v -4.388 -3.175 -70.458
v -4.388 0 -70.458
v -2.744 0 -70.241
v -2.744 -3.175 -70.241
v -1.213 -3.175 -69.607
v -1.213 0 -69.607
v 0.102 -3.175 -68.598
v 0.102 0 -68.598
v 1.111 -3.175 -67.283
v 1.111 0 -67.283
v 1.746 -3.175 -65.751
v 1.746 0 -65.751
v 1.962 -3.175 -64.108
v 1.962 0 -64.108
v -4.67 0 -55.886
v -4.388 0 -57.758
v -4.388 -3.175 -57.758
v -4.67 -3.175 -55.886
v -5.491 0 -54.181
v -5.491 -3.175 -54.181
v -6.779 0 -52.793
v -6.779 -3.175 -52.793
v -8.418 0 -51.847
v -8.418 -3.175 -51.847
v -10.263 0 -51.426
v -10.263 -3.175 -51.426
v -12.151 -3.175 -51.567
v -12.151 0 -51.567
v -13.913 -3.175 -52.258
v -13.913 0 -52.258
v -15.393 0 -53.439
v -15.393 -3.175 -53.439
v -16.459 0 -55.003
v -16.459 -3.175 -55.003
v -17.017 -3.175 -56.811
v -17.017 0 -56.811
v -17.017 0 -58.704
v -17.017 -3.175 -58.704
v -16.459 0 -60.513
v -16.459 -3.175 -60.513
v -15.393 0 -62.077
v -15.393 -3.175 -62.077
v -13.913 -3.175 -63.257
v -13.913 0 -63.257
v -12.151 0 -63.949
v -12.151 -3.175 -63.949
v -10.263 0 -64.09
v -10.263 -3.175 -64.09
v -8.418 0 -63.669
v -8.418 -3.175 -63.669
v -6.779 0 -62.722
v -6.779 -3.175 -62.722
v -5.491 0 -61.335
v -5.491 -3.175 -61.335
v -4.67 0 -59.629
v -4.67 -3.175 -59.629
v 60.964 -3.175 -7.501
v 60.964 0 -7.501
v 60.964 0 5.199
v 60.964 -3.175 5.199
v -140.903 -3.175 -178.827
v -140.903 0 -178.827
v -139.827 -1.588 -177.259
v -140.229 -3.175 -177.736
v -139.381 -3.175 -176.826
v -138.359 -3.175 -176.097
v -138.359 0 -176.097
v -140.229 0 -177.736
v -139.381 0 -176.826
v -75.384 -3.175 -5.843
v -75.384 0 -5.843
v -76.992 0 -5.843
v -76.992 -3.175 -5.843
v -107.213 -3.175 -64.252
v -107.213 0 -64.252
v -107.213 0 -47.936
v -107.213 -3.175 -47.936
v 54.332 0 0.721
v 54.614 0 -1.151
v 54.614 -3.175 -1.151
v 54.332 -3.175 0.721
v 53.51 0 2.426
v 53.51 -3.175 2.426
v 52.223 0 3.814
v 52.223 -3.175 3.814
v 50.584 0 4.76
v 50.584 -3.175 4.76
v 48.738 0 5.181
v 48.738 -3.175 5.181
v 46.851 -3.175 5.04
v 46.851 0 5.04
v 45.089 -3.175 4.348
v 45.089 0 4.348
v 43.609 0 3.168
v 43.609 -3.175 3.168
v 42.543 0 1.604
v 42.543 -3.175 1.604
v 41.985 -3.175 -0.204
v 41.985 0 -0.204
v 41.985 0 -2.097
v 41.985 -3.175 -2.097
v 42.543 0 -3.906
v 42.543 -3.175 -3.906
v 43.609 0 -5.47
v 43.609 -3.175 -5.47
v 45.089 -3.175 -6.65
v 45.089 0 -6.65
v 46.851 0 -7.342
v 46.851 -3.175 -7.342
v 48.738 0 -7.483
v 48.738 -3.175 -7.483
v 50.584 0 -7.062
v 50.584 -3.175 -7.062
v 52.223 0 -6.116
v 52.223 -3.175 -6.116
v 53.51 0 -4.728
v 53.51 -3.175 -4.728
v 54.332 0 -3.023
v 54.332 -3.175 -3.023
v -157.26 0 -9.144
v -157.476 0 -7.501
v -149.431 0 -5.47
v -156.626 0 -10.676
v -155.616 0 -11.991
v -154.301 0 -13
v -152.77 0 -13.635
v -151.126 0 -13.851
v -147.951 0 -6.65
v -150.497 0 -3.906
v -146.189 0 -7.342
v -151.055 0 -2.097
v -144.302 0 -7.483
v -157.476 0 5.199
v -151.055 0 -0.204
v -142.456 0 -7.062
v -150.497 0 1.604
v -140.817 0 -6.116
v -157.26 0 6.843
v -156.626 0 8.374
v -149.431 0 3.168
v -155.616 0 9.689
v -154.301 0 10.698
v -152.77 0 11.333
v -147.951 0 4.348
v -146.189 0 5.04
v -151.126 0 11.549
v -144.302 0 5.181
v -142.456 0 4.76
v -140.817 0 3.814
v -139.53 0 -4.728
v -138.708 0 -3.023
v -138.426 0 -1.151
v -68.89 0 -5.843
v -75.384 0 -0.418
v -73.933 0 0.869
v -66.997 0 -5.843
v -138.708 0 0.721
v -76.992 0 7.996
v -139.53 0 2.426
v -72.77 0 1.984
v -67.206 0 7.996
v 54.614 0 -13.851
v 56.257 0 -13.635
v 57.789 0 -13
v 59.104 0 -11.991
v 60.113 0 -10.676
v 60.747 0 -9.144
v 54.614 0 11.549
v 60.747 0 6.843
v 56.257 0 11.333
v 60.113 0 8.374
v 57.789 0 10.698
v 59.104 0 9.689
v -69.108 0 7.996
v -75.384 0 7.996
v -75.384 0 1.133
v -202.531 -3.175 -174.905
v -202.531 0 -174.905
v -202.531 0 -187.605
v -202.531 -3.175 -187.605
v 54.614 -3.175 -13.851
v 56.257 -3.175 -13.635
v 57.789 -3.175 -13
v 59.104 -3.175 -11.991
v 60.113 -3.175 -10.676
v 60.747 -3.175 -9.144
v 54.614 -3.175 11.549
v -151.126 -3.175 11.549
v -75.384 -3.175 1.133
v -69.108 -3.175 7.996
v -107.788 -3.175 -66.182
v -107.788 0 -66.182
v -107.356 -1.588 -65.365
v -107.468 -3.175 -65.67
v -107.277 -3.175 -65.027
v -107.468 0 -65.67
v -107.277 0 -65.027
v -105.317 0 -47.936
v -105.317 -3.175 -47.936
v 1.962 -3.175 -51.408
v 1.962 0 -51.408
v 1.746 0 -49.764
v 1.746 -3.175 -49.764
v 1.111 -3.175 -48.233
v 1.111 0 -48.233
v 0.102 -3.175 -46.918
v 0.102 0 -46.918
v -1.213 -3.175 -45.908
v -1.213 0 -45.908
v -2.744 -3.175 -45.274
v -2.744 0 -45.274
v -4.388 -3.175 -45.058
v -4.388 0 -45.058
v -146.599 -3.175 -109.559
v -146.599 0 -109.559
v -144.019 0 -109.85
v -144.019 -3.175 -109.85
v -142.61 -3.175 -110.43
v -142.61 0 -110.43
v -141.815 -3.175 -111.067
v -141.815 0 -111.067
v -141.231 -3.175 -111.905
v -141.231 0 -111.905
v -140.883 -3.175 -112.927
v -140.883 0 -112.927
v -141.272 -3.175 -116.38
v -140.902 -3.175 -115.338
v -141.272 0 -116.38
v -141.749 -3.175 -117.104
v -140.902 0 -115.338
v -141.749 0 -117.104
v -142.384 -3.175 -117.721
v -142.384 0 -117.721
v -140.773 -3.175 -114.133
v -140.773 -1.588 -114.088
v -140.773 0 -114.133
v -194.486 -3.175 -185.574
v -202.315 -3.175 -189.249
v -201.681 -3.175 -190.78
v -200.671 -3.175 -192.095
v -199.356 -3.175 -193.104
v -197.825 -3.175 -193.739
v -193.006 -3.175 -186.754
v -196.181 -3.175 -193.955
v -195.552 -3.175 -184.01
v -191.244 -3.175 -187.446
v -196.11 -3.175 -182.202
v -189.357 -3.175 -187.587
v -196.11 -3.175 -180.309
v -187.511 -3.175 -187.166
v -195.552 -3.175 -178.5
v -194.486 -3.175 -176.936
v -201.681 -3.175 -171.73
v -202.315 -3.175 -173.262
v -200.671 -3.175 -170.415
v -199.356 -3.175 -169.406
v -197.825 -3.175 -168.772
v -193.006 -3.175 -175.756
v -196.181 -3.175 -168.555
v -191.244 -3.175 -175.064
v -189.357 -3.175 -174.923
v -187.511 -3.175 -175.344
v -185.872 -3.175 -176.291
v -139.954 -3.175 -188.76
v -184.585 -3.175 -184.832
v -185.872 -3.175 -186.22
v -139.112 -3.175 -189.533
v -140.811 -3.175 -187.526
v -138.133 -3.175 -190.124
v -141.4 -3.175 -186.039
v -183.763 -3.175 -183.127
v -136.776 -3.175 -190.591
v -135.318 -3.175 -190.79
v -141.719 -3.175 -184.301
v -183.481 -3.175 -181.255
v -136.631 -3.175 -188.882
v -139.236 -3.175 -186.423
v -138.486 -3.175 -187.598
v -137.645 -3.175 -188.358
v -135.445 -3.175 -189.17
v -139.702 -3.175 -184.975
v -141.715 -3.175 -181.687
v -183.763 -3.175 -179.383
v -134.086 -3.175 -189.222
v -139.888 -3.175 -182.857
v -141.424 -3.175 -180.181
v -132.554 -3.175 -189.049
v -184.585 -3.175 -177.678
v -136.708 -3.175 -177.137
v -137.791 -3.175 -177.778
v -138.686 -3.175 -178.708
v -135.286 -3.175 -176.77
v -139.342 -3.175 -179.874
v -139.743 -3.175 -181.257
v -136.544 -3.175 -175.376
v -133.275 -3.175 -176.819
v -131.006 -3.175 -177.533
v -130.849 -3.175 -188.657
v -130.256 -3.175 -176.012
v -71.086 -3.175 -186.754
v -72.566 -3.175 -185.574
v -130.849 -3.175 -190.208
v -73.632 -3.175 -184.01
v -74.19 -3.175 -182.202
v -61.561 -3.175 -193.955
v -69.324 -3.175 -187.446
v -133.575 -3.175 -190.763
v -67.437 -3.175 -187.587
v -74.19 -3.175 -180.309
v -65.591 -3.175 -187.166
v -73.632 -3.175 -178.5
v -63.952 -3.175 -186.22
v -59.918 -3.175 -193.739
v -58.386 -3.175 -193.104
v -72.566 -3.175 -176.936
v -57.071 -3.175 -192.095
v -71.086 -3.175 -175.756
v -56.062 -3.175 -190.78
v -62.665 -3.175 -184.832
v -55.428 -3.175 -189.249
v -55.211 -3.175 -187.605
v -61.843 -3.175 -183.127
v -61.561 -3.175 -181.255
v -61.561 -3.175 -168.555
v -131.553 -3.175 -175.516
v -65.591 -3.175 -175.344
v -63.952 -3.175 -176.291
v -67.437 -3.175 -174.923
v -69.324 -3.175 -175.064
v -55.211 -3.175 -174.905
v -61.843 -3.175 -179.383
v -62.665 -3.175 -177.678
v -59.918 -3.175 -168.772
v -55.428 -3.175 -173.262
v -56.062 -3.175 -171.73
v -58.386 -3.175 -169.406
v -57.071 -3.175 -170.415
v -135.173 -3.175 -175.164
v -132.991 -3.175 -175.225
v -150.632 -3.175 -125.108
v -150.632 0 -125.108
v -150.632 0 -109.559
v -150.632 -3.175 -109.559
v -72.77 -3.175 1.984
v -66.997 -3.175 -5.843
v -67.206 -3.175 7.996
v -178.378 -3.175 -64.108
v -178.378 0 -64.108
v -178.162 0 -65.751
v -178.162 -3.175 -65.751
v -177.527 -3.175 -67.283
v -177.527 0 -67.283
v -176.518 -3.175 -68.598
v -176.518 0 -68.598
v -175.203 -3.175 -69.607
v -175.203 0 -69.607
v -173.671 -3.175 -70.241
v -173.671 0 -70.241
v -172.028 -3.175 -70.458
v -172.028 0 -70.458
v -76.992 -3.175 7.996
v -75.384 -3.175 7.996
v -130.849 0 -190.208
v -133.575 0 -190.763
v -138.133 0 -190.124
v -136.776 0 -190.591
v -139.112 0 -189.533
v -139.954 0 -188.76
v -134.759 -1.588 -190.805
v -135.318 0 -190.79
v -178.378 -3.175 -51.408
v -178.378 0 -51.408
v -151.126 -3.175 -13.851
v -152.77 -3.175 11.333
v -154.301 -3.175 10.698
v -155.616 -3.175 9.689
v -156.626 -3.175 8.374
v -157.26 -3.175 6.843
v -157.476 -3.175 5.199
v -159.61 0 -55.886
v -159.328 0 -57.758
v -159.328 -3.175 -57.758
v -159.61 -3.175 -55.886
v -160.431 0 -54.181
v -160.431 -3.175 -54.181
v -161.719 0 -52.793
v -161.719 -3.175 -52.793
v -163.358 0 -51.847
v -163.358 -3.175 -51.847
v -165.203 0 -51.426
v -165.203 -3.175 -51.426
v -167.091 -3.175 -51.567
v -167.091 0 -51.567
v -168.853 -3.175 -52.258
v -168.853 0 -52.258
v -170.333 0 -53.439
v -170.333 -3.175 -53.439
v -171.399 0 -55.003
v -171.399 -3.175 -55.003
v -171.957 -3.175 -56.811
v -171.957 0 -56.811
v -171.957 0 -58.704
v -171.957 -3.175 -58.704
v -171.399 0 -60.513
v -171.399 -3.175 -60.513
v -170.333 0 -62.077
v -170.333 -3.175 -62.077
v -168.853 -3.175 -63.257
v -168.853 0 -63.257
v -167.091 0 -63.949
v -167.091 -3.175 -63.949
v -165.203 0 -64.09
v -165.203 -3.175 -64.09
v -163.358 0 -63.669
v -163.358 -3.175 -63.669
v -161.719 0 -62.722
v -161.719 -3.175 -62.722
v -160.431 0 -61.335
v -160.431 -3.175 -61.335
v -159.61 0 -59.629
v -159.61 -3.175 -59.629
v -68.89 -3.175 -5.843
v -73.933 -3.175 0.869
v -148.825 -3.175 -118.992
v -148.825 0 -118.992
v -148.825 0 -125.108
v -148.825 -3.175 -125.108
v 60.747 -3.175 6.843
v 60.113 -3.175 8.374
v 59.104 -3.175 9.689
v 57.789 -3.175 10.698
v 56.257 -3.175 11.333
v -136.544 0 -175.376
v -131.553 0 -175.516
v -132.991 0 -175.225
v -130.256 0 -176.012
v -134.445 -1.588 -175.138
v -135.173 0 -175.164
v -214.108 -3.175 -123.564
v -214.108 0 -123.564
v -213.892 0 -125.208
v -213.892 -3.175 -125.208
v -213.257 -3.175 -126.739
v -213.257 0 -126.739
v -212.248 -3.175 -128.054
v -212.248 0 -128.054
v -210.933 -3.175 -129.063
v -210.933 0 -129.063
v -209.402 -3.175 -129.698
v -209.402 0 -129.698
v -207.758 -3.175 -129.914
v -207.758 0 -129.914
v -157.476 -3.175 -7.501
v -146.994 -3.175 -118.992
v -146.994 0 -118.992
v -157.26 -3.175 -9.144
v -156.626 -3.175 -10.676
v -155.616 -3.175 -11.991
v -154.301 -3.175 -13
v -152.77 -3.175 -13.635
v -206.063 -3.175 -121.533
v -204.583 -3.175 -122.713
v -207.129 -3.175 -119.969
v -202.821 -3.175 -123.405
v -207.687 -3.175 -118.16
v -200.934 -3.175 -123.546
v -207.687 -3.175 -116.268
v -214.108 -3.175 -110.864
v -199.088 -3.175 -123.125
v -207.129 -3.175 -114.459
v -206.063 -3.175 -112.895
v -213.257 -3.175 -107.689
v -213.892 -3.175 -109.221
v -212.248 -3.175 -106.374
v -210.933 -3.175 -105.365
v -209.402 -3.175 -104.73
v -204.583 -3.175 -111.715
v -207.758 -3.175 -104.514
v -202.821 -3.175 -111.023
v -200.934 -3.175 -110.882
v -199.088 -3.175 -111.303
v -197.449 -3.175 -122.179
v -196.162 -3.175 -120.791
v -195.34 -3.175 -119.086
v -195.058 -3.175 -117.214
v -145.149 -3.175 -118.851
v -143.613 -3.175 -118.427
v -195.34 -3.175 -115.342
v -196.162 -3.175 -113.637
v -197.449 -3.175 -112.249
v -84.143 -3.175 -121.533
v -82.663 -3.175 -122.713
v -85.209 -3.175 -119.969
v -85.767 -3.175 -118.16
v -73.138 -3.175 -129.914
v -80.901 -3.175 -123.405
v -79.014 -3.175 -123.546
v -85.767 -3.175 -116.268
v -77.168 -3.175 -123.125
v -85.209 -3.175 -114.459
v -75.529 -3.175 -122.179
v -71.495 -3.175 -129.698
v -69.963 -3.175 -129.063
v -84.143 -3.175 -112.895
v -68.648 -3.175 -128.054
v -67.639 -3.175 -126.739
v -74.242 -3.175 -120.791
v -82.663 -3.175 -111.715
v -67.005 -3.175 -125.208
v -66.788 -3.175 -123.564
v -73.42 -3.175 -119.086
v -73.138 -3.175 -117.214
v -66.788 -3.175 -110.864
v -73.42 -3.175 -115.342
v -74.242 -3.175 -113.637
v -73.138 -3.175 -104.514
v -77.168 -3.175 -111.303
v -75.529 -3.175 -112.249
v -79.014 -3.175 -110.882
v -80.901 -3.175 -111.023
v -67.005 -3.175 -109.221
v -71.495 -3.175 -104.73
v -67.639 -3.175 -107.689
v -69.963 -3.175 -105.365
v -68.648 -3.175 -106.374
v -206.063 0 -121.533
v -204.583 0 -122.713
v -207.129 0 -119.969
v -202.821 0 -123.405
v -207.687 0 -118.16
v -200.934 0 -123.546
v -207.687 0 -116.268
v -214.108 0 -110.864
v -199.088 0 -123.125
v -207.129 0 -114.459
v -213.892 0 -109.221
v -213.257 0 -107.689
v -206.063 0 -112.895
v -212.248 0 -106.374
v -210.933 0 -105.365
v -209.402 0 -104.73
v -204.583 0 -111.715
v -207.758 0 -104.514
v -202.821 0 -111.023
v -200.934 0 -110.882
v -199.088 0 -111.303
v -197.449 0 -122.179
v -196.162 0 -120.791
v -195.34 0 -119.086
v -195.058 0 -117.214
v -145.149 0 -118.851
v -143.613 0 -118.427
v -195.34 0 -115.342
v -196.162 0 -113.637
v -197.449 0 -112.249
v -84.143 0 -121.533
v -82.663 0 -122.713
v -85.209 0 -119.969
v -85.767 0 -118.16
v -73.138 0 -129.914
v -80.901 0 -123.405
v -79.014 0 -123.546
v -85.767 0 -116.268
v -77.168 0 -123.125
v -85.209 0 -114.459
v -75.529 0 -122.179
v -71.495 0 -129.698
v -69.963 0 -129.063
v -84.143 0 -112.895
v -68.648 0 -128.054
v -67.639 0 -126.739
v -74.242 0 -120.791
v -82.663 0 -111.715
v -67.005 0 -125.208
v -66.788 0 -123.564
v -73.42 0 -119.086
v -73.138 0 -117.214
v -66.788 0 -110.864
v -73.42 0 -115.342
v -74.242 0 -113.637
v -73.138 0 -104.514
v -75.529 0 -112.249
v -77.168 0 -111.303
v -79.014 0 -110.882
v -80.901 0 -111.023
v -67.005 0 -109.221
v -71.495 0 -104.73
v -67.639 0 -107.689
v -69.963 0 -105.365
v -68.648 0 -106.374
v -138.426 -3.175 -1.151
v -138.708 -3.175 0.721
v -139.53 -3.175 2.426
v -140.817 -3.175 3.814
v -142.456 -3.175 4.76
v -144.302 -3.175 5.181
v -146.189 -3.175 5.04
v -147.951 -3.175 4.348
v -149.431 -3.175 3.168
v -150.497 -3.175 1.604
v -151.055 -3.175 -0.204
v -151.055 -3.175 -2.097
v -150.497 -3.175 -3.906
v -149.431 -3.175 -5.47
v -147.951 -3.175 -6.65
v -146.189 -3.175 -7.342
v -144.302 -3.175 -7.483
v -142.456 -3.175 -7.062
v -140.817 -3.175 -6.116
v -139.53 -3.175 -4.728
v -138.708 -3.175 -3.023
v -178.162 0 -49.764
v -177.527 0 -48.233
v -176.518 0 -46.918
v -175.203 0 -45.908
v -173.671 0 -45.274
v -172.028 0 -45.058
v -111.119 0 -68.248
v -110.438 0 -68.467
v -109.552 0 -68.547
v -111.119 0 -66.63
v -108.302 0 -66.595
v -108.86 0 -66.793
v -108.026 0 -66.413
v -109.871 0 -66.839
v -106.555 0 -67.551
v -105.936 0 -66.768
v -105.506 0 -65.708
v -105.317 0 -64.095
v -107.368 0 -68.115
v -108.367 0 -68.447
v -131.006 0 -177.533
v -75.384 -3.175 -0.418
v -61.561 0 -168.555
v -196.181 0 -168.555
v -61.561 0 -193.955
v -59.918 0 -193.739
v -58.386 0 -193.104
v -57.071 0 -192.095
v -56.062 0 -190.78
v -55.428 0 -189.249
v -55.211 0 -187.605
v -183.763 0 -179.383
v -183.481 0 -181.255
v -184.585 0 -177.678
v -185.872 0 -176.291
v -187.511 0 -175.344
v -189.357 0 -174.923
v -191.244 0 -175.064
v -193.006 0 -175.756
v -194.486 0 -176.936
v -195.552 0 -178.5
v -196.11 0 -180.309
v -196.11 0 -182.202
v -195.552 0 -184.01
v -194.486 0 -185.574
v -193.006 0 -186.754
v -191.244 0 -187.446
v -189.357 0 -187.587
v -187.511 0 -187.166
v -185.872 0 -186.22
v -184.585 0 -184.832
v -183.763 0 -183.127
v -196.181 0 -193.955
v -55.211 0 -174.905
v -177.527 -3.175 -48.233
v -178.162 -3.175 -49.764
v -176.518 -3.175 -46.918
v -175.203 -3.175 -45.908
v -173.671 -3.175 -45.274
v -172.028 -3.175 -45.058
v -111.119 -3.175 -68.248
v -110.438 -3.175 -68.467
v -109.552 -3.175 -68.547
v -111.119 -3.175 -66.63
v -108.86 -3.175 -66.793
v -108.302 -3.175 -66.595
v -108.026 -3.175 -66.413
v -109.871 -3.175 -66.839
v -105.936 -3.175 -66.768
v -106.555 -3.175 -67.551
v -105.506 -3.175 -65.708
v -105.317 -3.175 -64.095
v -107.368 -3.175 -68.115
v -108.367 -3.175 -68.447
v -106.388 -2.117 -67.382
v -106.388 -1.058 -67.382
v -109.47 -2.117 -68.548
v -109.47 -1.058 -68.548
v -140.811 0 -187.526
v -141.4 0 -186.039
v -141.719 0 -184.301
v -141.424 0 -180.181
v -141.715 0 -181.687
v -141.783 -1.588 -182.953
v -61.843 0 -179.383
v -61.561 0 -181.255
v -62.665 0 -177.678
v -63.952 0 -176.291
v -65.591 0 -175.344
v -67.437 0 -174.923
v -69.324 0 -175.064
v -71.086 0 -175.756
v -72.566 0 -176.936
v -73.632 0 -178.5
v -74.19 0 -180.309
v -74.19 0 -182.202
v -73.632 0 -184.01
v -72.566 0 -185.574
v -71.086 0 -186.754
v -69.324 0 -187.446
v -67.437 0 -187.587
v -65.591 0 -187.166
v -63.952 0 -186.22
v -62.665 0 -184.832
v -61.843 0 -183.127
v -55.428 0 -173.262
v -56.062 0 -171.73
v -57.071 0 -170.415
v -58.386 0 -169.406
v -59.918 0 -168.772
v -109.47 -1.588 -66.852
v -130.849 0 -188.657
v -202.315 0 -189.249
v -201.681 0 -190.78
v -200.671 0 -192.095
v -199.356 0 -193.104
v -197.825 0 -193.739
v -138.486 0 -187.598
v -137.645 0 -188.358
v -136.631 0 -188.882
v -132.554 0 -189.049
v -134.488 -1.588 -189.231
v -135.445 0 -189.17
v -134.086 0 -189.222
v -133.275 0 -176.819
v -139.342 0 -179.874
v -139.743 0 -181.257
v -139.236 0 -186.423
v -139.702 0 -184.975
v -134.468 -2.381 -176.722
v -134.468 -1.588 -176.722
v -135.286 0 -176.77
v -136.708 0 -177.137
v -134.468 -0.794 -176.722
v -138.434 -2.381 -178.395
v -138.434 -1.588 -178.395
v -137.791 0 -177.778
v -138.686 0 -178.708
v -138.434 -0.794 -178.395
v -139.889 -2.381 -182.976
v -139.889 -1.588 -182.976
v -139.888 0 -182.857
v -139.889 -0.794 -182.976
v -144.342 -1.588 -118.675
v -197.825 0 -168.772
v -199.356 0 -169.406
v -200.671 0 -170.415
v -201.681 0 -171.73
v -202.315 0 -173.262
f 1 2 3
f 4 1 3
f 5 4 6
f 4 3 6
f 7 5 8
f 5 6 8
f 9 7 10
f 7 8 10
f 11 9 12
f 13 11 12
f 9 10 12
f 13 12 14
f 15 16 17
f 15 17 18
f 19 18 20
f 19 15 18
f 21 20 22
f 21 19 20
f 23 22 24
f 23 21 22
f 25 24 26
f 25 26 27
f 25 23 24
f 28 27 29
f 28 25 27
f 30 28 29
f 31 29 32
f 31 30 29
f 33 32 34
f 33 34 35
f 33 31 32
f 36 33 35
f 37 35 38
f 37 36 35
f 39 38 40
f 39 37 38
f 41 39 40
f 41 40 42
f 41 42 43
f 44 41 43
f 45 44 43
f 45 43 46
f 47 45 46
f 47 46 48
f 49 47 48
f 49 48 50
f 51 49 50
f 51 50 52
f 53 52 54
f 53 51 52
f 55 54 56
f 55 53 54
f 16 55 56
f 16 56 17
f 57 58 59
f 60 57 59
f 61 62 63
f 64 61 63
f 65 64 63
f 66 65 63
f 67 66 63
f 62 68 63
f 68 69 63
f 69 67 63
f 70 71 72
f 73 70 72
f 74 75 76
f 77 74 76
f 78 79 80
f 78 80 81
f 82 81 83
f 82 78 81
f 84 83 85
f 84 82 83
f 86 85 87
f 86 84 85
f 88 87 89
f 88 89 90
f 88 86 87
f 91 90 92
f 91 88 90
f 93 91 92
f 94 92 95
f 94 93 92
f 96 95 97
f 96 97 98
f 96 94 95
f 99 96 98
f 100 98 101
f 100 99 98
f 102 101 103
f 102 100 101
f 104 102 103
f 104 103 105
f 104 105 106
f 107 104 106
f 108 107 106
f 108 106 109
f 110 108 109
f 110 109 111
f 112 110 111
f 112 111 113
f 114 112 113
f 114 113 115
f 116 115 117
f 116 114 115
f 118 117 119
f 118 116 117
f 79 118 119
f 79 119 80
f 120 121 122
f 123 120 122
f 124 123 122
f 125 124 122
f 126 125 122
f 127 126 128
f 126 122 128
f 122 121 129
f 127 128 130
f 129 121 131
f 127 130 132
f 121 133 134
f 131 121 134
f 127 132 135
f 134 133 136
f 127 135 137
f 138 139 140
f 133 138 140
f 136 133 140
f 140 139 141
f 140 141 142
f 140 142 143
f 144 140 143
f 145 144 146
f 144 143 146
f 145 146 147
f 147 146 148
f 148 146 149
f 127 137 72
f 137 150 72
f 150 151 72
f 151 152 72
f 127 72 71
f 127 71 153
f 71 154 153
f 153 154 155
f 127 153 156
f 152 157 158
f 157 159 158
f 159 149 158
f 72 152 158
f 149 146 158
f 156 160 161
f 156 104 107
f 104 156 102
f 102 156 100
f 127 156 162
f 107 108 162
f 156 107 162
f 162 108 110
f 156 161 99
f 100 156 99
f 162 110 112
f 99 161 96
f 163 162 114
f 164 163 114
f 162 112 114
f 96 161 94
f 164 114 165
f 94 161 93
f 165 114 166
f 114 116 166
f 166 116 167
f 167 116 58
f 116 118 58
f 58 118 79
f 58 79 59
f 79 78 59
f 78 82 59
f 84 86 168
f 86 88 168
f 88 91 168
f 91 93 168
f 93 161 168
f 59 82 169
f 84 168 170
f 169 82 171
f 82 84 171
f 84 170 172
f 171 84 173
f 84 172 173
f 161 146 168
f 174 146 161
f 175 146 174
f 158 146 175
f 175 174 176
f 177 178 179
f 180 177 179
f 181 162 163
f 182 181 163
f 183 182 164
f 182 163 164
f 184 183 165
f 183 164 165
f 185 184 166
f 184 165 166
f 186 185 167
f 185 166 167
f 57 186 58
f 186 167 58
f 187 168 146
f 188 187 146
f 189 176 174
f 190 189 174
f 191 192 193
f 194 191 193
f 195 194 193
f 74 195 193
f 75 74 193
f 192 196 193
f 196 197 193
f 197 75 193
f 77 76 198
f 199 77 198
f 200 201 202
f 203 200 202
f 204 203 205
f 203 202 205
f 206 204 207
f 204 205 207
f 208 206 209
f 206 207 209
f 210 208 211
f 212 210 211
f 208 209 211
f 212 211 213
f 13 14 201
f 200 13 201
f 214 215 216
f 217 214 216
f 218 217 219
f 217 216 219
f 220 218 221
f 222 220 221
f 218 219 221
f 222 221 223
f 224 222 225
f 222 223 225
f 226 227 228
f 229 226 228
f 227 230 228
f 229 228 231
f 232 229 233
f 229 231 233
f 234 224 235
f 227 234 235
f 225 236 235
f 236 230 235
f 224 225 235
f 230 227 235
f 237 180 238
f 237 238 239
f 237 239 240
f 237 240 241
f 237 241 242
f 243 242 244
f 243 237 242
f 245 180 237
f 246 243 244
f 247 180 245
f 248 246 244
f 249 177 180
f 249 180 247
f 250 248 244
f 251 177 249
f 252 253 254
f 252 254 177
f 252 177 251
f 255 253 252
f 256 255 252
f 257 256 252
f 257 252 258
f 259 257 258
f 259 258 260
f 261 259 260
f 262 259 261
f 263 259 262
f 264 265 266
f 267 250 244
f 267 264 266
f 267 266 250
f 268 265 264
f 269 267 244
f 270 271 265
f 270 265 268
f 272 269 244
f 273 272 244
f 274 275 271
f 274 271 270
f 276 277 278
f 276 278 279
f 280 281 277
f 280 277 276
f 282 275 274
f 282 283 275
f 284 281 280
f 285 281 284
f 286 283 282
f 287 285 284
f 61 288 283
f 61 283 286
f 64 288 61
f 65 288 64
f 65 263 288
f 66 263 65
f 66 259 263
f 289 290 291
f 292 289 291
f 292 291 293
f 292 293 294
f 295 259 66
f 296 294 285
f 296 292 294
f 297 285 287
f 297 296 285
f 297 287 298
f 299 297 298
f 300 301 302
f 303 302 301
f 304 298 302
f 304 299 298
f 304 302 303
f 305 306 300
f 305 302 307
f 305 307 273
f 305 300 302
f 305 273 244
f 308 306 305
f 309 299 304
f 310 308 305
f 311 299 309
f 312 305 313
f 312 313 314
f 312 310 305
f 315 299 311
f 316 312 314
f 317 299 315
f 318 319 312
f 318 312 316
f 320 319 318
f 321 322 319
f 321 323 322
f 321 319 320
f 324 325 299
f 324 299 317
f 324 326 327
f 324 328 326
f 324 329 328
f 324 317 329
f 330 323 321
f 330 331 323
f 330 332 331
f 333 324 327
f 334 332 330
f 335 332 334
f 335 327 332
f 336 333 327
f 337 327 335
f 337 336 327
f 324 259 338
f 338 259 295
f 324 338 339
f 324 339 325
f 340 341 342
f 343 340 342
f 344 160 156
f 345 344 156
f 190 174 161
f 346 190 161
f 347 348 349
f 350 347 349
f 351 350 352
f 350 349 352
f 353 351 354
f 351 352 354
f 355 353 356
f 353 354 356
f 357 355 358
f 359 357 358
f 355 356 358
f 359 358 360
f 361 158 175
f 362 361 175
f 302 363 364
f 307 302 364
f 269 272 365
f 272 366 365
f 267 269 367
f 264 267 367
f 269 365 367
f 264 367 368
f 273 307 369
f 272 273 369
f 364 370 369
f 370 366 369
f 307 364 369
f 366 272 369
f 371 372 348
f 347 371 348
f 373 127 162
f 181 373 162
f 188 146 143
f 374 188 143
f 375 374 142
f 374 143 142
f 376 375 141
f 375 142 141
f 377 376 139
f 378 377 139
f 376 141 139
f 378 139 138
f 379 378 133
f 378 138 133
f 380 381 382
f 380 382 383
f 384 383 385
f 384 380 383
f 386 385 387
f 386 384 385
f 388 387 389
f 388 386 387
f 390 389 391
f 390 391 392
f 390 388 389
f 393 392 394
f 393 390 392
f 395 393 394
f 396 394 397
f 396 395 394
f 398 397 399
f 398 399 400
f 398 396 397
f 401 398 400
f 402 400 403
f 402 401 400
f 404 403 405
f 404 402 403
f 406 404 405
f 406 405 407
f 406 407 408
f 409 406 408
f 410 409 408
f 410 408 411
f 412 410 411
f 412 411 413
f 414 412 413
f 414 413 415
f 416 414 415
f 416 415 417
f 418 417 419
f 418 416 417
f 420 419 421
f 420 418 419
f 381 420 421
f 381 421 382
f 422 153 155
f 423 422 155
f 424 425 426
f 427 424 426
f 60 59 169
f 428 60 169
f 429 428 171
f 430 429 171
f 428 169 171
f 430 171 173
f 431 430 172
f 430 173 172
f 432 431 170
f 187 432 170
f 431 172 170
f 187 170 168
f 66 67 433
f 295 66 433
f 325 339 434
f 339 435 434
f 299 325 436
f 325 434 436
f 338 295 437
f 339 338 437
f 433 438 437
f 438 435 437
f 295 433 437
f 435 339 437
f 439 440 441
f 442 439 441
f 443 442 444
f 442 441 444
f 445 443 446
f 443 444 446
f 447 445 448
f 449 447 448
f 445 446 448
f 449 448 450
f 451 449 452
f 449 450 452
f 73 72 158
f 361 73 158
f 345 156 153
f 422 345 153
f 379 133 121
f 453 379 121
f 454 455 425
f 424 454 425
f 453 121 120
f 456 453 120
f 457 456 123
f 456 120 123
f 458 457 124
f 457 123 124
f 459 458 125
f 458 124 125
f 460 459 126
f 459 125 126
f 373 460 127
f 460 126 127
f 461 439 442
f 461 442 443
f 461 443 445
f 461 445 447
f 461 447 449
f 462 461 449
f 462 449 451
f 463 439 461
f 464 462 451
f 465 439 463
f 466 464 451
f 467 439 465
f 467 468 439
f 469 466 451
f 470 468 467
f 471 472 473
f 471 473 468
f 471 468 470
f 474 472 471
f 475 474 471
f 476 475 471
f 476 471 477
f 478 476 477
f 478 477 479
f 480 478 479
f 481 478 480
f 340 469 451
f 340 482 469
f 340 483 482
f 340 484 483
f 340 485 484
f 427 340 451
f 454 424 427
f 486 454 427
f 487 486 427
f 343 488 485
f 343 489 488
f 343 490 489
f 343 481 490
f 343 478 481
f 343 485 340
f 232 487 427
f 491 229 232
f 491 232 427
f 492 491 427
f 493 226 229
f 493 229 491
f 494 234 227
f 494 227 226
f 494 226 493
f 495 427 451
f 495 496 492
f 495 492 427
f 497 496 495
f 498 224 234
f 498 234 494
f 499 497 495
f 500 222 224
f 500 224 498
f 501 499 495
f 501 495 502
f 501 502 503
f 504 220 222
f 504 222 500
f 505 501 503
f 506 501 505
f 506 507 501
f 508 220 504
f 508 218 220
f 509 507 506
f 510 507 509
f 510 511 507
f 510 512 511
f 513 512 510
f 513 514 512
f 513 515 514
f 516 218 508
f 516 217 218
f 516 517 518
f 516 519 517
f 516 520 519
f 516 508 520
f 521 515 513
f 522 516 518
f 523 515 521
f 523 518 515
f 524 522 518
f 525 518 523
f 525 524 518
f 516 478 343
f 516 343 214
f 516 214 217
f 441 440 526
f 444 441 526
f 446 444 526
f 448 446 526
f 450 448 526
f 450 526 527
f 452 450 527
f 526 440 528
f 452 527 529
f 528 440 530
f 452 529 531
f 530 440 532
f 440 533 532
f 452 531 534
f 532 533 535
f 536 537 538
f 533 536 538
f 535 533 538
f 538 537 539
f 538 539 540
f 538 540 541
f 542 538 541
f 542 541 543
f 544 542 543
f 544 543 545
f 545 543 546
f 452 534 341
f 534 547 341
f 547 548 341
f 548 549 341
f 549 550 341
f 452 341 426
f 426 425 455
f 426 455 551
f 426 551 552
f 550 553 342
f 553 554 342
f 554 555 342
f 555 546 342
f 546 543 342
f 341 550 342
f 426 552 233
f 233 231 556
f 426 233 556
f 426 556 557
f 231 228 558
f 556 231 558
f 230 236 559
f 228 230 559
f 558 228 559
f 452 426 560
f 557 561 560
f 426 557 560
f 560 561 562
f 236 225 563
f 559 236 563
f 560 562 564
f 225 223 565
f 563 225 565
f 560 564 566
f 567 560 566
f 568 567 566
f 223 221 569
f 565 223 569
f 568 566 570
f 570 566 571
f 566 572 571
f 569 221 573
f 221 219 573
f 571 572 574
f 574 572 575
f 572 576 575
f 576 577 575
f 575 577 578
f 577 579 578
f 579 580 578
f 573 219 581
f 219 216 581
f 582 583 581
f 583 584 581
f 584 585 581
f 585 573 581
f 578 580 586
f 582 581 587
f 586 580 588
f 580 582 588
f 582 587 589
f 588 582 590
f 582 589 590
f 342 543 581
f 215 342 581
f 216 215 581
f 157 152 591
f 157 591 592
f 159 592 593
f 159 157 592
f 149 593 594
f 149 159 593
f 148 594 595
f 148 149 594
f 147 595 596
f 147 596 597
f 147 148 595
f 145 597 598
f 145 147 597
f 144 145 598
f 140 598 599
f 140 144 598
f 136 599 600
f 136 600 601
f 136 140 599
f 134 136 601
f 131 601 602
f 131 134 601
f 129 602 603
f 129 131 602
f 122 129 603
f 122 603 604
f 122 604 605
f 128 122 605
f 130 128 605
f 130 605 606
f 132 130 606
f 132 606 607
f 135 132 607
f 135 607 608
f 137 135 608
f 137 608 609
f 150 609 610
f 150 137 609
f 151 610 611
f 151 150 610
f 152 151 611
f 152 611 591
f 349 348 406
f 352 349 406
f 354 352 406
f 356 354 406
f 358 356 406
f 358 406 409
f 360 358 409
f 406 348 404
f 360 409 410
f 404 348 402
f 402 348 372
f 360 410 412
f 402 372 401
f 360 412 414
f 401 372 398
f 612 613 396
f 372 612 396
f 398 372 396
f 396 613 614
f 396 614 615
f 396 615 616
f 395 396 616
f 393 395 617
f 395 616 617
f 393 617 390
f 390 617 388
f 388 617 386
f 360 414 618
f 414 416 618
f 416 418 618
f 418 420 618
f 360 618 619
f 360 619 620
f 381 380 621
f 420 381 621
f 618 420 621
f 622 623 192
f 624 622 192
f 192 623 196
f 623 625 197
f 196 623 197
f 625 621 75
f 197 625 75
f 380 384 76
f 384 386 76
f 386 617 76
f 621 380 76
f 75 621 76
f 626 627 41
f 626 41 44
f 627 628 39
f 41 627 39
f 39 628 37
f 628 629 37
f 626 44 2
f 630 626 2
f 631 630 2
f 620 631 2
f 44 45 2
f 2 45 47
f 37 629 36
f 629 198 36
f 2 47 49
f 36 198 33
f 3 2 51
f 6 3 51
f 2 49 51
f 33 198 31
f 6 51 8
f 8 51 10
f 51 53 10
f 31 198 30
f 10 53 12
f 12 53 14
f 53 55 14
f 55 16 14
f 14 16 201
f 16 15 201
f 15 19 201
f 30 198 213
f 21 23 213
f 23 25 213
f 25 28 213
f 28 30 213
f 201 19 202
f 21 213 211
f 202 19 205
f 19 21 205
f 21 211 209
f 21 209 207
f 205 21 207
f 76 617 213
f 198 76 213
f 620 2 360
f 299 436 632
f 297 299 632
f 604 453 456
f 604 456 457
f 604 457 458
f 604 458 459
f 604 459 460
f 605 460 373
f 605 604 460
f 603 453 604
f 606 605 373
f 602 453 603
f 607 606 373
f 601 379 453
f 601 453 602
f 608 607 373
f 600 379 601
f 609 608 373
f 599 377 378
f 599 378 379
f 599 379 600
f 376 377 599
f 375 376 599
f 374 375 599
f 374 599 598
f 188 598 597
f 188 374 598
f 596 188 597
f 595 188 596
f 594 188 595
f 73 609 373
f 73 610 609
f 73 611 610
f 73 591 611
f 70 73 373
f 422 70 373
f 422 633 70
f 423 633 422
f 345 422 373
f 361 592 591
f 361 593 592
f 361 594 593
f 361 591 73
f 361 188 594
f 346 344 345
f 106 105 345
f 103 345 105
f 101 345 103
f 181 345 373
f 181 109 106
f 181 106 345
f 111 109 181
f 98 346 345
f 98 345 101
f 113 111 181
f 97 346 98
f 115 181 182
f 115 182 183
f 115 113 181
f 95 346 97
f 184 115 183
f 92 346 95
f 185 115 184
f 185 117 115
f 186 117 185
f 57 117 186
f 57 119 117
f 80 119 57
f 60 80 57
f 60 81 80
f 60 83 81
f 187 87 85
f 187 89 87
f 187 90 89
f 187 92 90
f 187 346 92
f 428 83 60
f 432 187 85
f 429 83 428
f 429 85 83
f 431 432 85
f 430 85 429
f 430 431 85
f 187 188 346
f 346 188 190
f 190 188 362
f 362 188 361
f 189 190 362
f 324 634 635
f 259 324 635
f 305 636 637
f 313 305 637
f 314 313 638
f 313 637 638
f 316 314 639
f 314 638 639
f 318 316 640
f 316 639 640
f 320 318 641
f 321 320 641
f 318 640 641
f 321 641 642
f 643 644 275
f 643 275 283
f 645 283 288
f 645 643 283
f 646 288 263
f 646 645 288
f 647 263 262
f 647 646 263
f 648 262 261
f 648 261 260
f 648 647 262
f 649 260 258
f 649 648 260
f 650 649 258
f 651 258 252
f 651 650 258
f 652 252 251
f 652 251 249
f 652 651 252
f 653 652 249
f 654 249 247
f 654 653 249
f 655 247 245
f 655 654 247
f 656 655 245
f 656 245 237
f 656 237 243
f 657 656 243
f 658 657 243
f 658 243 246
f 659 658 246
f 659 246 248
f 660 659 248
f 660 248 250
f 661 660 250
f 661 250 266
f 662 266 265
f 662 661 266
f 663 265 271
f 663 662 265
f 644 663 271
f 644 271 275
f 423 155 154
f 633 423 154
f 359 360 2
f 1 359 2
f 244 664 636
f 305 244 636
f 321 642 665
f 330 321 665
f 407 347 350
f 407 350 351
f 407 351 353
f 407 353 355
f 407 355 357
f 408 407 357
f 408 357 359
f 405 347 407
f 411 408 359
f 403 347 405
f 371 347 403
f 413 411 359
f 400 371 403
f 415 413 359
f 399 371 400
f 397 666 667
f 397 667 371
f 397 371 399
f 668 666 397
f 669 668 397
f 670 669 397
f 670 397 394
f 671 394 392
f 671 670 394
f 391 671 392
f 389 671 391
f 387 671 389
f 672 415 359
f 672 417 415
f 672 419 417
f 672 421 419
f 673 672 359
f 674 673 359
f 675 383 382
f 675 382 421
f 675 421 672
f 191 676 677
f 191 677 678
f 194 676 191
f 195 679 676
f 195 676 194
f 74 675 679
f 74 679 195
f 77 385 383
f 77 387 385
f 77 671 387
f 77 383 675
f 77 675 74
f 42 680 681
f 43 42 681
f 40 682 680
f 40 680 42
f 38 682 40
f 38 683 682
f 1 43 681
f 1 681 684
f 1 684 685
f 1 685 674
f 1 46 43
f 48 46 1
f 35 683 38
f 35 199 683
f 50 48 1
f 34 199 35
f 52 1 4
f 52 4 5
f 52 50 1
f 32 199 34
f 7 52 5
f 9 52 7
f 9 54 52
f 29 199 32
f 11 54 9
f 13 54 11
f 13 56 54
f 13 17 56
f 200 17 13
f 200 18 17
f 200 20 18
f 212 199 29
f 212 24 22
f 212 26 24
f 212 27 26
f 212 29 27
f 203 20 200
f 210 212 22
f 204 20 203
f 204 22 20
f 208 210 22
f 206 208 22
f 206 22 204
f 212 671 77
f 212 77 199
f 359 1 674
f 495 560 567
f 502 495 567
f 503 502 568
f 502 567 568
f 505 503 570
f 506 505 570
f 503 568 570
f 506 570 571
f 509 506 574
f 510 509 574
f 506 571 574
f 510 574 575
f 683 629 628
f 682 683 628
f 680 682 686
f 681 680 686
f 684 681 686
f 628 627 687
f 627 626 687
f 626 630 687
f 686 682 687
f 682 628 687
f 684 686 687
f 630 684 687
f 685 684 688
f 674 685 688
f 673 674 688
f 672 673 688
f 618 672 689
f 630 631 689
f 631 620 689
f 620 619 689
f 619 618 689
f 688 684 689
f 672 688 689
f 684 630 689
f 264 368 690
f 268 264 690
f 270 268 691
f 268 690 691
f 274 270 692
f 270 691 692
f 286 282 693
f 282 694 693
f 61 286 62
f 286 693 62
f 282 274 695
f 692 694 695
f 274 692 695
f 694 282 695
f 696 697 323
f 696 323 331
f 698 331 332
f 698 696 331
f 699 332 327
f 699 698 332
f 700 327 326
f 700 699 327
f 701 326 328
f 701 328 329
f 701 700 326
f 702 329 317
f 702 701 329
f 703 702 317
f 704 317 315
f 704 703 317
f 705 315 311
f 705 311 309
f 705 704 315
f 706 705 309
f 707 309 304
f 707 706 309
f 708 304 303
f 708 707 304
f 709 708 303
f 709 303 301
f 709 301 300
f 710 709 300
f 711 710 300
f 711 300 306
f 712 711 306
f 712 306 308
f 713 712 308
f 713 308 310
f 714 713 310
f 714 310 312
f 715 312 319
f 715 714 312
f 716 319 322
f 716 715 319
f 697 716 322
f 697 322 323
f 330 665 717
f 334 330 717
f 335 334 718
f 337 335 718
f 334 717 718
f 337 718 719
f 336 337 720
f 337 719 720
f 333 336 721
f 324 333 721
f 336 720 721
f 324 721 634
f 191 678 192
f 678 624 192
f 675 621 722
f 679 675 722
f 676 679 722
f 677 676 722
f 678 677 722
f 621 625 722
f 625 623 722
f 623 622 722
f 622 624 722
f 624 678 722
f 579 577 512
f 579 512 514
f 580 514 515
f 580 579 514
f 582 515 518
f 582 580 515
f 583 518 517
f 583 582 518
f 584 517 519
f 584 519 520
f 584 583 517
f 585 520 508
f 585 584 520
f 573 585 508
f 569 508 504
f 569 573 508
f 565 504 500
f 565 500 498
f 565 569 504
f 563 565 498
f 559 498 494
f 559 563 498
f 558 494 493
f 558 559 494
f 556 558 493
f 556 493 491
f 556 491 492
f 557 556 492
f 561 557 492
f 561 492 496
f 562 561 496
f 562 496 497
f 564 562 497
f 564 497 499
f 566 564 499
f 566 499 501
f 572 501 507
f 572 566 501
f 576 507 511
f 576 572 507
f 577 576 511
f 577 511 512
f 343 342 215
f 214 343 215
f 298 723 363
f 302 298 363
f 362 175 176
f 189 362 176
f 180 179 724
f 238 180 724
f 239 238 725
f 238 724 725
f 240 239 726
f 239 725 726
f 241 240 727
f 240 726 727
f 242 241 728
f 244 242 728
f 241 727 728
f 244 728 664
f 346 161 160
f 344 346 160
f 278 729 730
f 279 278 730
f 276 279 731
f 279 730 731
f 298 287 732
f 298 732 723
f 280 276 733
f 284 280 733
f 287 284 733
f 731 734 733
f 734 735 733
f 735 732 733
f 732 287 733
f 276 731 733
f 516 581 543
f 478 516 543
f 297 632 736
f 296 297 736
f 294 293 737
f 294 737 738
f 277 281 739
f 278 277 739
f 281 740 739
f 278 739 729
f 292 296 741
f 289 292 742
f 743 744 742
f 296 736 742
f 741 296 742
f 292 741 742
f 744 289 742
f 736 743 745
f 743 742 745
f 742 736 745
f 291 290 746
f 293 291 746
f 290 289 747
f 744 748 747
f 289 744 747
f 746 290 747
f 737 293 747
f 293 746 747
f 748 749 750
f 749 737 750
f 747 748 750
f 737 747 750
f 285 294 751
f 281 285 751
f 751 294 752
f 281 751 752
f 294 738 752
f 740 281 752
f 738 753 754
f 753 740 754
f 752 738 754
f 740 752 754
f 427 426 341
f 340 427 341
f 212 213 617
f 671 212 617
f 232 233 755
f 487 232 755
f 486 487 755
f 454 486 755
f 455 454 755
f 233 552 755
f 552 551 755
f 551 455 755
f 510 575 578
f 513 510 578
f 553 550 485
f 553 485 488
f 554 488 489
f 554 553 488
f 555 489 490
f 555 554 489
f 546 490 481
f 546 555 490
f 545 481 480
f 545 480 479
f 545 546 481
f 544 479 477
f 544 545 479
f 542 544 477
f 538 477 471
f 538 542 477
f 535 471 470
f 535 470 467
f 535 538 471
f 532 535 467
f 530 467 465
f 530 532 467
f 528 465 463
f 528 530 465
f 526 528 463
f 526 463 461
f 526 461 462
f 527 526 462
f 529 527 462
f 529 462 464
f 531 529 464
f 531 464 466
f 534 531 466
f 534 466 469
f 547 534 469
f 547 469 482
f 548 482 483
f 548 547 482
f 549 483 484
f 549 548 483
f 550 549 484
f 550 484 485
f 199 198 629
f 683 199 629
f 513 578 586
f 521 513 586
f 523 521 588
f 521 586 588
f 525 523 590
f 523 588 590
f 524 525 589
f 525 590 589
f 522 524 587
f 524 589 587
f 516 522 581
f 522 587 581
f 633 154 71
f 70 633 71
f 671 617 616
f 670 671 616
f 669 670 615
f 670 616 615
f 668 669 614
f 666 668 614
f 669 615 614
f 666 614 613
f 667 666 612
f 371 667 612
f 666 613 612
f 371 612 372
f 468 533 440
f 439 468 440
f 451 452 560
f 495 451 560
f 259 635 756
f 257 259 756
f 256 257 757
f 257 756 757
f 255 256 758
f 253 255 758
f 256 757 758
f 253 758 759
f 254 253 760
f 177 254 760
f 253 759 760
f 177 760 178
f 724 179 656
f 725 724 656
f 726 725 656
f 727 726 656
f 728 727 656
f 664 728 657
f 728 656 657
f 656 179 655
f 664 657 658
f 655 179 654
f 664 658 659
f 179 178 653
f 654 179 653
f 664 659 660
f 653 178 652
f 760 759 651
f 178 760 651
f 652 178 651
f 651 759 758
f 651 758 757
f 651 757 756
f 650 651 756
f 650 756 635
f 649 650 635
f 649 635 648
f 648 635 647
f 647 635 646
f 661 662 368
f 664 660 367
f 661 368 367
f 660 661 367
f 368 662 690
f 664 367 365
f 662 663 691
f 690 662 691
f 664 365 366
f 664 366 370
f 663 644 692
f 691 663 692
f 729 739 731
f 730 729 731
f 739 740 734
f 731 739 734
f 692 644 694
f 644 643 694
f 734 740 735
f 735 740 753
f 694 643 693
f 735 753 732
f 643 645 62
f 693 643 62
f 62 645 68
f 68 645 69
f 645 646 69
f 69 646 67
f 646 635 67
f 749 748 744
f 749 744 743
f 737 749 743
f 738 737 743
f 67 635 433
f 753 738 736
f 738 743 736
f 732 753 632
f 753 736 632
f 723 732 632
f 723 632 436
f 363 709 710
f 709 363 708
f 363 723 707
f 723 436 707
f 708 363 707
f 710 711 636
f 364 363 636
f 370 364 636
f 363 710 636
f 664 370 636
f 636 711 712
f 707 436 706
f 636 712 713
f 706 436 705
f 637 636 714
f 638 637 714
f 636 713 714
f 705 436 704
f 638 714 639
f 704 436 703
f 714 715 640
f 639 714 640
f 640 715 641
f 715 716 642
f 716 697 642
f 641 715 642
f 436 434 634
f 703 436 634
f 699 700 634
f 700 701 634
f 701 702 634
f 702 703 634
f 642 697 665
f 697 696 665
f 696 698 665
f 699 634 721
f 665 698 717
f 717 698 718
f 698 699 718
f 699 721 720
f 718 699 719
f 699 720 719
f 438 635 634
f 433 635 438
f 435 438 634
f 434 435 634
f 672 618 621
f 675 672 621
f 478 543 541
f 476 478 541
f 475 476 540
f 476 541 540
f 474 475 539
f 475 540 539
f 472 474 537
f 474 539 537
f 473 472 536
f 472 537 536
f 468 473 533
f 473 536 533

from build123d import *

# Parameters (mm, degrees)
F0_R     = 6.35
F1_DEPTH = 3.175
F2_R     = 6.35
F3_DEPTH = 3.175
F4_R     = 6.35
F5_DEPTH = 3.175
F6_R     = 6.35
F7_DEPTH = 3.175


with BuildPart() as f1:
    # F0 (on Front) → F1 (new body)
    with BuildSketch(Plane.XZ):
        with BuildLine():
            Line((54.613753643, 11.5491279232), (-151.126246357, 11.5491279232))
            ThreePointArc((-151.126246357, 11.5491279232), (-155.6163744175, 9.6892559838), (-157.476246357, 5.1991279232))
            Line((-157.476246357, 5.1991279232), (-157.476246357, -7.5008720768))
            ThreePointArc((-157.476246357, -7.5008720768), (-155.6163744175, -11.9910001373), (-151.126246357, -13.8508720768))
            Line((-151.126246357, -13.8508720768), (54.613753643, -13.8508720768))
            ThreePointArc((54.613753643, -13.8508720768), (59.1038817036, -11.9910001373), (60.963753643, -7.5008720768))
            Line((60.963753643, -7.5008720768), (60.963753643, 5.1991279232))
            ThreePointArc((60.963753643, 5.1991279232), (59.1038817036, 9.6892559838), (54.613753643, 11.5491279232))
        make_face()
        with Locations((-144.776246357, -1.1508720768)):
            Circle(F0_R, mode=Mode.SUBTRACT)
        with Locations((48.263753643, -1.1508720768)):
            Circle(F0_R, mode=Mode.SUBTRACT)
        Polygon((-72.7701305526, 1.9838299405), (-66.9970292252, -5.842871964), (-68.8900976038, -5.842871964), (-73.9332317644, 0.8691912792), (-75.3840793697, -0.4180952183), (-75.3840793697, -5.842871964), (-76.9924302642, -5.842871964), (-76.9924302642, 7.9962151109), (-75.3840793697, 7.9962151109), (-75.3840793697, 1.1327063975), (-69.108179081, 7.9962151109), (-67.2060239742, 7.9962151109), align=None, mode=Mode.SUBTRACT)
    extrude(amount=F1_DEPTH)


with BuildPart() as f3:
    # F2 (on Front) → F3 (new body)
    with BuildSketch(Plane.XZ):
        with BuildLine():
            Line((-4.3879321891, -45.0577498466), (-172.0279321891, -45.0577498466))
            ThreePointArc((-172.0279321891, -45.0577498466), (-176.5180602496, -46.917621786), (-178.3779321891, -51.4077498466))
            Line((-178.3779321891, -51.4077498466), (-178.3779321891, -64.1077498466))
            ThreePointArc((-178.3779321891, -64.1077498466), (-176.5180602496, -68.5978779071), (-172.0279321891, -70.4577498466))
            Line((-172.0279321891, -70.4577498466), (-4.3879321891, -70.4577498466))
            ThreePointArc((-4.3879321891, -70.4577498466), (0.1021958714, -68.5978779071), (1.9620678109, -64.1077498466))
            Line((1.9620678109, -64.1077498466), (1.9620678109, -51.4077498466))
            ThreePointArc((1.9620678109, -51.4077498466), (0.1021958714, -46.917621786), (-4.3879321891, -45.0577498466))
        make_face()
        with BuildLine():
            add(Edge.make_bspline(
                [(-106.3878316248, -67.3819416657), (-107.4591382882, -68.5478804177), (-109.4696237932, -68.5478804177)],
                knots=[0, 0, 0, 1, 1, 1], degree=2))
            add(Edge.make_bspline(
                [(-109.4696237932, -68.5478804177), (-110.5159333011, -68.5478804177), (-111.1194360549, -68.247914552)],
                knots=[0, 0, 0, 1, 1, 1], degree=2))
            Line((-111.1194360549, -68.247914552), (-111.1194360549, -66.6302414902))
            add(Edge.make_bspline(
                [(-111.1194360549, -66.6302414902), (-110.3266691239, -66.8516448673), (-109.4696237932, -66.8516448673)],
                knots=[0, 0, 0, 1, 1, 1], degree=2))
            add(Edge.make_bspline(
                [(-109.4696237932, -66.8516448673), (-108.3626069077, -66.8516448673), (-107.7876723316, -66.1820782027)],
                knots=[0, 0, 0, 1, 1, 1], degree=2))
            add(Edge.make_bspline(
                [(-107.7876723316, -66.1820782027), (-107.2127377556, -65.512511538), (-107.2127377556, -64.2519406974)],
                knots=[0, 0, 0, 1, 1, 1], degree=2))
            Line((-107.2127377556, -64.2519406974), (-107.2127377556, -47.9359402137))
            Line((-107.2127377556, -47.9359402137), (-105.3165249614, -47.9359402137))
            Line((-105.3165249614, -47.9359402137), (-105.3165249614, -64.0948157201))
            add(Edge.make_bspline(
                [(-105.3165249614, -64.0948157201), (-105.3165249614, -66.2160029137), (-106.3878316248, -67.3819416657)],
                knots=[0, 0, 0, 1, 1, 1], degree=2))
        make_face(mode=Mode.SUBTRACT)
        with Locations((-165.6779321891, -57.7577498466)):
            Circle(F2_R, mode=Mode.SUBTRACT)
        with Locations((-10.7379321891, -57.7577498466)):
            Circle(F2_R, mode=Mode.SUBTRACT)
    extrude(amount=F3_DEPTH)


with BuildPart() as f5:
    # F4 (on Front) → F5 (new body)
    with BuildSketch(Plane.XZ):
        with BuildLine():
            Line((-73.1382252097, -104.514076221), (-207.7582252097, -104.514076221))
            ThreePointArc((-207.7582252097, -104.514076221), (-212.2483532702, -106.3739481605), (-214.1082252097, -110.864076221))
            Line((-214.1082252097, -110.864076221), (-214.1082252097, -123.564076221))
            ThreePointArc((-214.1082252097, -123.564076221), (-212.2483532702, -128.0542042815), (-207.7582252097, -129.914076221))
            Line((-207.7582252097, -129.914076221), (-73.1382252097, -129.914076221))
            ThreePointArc((-73.1382252097, -129.914076221), (-68.6480971492, -128.0542042815), (-66.7882252097, -123.564076221))
            Line((-66.7882252097, -123.564076221), (-66.7882252097, -110.864076221))
            ThreePointArc((-66.7882252097, -110.864076221), (-68.6480971492, -106.3739481605), (-73.1382252097, -104.514076221))
        make_face()
        with BuildLine():
            add(Edge.make_bspline(
                [(-146.5991649036, -109.5589734274), (-140.7730584275, -109.5589734274), (-140.7730584275, -114.0884989646)],
                knots=[0, 0, 0, 1, 1, 1], degree=2))
            add(Edge.make_bspline(
                [(-140.7730584275, -114.0884989646), (-140.7730584275, -116.4502500712), (-142.3844260773, -117.7213077632)],
                knots=[0, 0, 0, 1, 1, 1], degree=2))
            add(Edge.make_bspline(
                [(-142.3844260773, -117.7213077632), (-143.9957937271, -118.9923654553), (-146.9939244546, -118.9923654553)],
                knots=[0, 0, 0, 1, 1, 1], degree=2))
            Line((-146.9939244546, -118.9923654553), (-148.8247920271, -118.9923654553))
            Line((-148.8247920271, -118.9923654553), (-148.8247920271, -125.1077353954))
            Line((-148.8247920271, -125.1077353954), (-150.6318379025, -125.1077353954))
            Line((-150.6318379025, -125.1077353954), (-150.6318379025, -109.5589734274))
            Line((-150.6318379025, -109.5589734274), (-146.5991649036, -109.5589734274))
        make_face(mode=Mode.SUBTRACT)
        with Locations((-201.4082252097, -117.214076221)):
            Circle(F4_R, mode=Mode.SUBTRACT)
        with Locations((-79.4882252097, -117.214076221)):
            Circle(F4_R, mode=Mode.SUBTRACT)
    extrude(amount=F5_DEPTH)


with BuildPart() as f7:
    # F6 (on Front) → F7 (new body)
    with BuildSketch(Plane.XZ):
        with BuildLine():
            Line((-61.5613216782, -168.5551468611), (-196.1813216782, -168.5551468611))
            ThreePointArc((-196.1813216782, -168.5551468611), (-200.6714497387, -170.4150188005), (-202.5313216782, -174.9051468611))
            Line((-202.5313216782, -174.9051468611), (-202.5313216782, -187.6051468611))
            ThreePointArc((-202.5313216782, -187.6051468611), (-200.6714497387, -192.0952749216), (-196.1813216782, -193.9551468611))
            Line((-196.1813216782, -193.9551468611), (-61.5613216782, -193.9551468611))
            ThreePointArc((-61.5613216782, -193.9551468611), (-57.0711936176, -192.0952749216), (-55.2113216782, -187.6051468611))
            Line((-55.2113216782, -187.6051468611), (-55.2113216782, -174.9051468611))
            ThreePointArc((-55.2113216782, -174.9051468611), (-57.0711936176, -170.4150188005), (-61.5613216782, -168.5551468611))
        make_face()
        with Locations((-189.8313216782, -181.2551468611)):
            Circle(F6_R, mode=Mode.SUBTRACT)
        with BuildLine():
            add(Edge.make_bspline(
                [(-131.0060910053, -177.5327917551), (-132.7372555065, -176.7222465262), (-134.4684200077, -176.7222465262)],
                knots=[0, 0, 0, 1, 1, 1], degree=2))
            add(Edge.make_bspline(
                [(-134.4684200077, -176.7222465262), (-136.9801095441, -176.7222465262), (-138.4344211482, -178.3950384286)],
                knots=[0, 0, 0, 1, 1, 1], degree=2))
            add(Edge.make_bspline(
                [(-138.4344211482, -178.3950384286), (-139.8887327523, -180.067830331), (-139.8887327523, -182.9764535392)],
                knots=[0, 0, 0, 1, 1, 1], degree=2))
            add(Edge.make_bspline(
                [(-139.8887327523, -182.9764535392), (-139.8887327523, -185.9651305971), (-138.4861225928, -187.5978955747)],
                knots=[0, 0, 0, 1, 1, 1], degree=2))
            add(Edge.make_bspline(
                [(-138.4861225928, -187.5978955747), (-137.0835124334, -189.2306605522), (-134.4884334701, -189.2306605522)],
                knots=[0, 0, 0, 1, 1, 1], degree=2))
            add(Edge.make_bspline(
                [(-134.4884334701, -189.2306605522), (-132.8940276289, -189.2306605522), (-130.8493188828, -188.6569412955)],
                knots=[0, 0, 0, 1, 1, 1], degree=2))
            Line((-130.8493188828, -188.6569412955), (-130.8493188828, -190.2079846348))
            add(Edge.make_bspline(
                [(-130.8493188828, -190.2079846348), (-132.4337179928, -190.805052931), (-134.7586152131, -190.805052931)],
                knots=[0, 0, 0, 1, 1, 1], degree=2))
            add(Edge.make_bspline(
                [(-134.7586152131, -190.805052931), (-138.1242124804, -190.805052931), (-139.9537765052, -188.7603441848)],
                knots=[0, 0, 0, 1, 1, 1], degree=2))
            add(Edge.make_bspline(
                [(-139.9537765052, -188.7603441848), (-141.7833405301, -186.7156354387), (-141.7833405301, -182.9531044997)],
                knots=[0, 0, 0, 1, 1, 1], degree=2))
            add(Edge.make_bspline(
                [(-141.7833405301, -182.9531044997), (-141.7833405301, -180.5981870857), (-140.9027481827, -178.8269956596)],
                knots=[0, 0, 0, 1, 1, 1], degree=2))
            add(Edge.make_bspline(
                [(-140.9027481827, -178.8269956596), (-140.0221558352, -177.0558042335), (-138.359370664, -176.0968258249)],
                knots=[0, 0, 0, 1, 1, 1], degree=2))
            add(Edge.make_bspline(
                [(-138.359370664, -176.0968258249), (-136.6965854929, -175.1378474162), (-134.4450709682, -175.1378474162)],
                knots=[0, 0, 0, 1, 1, 1], degree=2))
            add(Edge.make_bspline(
                [(-134.4450709682, -175.1378474162), (-132.0501266293, -175.1378474162), (-130.2555861637, -176.0117686095)],
                knots=[0, 0, 0, 1, 1, 1], degree=2))
            Line((-130.2555861637, -176.0117686095), (-131.0060910053, -177.5327917551))
        make_face(mode=Mode.SUBTRACT)
        with Locations((-67.9113216782, -181.2551468611)):
            Circle(F6_R, mode=Mode.SUBTRACT)
    extrude(amount=F7_DEPTH)


solid = Compound([f1.part, f3.part, f5.part, f7.part])
